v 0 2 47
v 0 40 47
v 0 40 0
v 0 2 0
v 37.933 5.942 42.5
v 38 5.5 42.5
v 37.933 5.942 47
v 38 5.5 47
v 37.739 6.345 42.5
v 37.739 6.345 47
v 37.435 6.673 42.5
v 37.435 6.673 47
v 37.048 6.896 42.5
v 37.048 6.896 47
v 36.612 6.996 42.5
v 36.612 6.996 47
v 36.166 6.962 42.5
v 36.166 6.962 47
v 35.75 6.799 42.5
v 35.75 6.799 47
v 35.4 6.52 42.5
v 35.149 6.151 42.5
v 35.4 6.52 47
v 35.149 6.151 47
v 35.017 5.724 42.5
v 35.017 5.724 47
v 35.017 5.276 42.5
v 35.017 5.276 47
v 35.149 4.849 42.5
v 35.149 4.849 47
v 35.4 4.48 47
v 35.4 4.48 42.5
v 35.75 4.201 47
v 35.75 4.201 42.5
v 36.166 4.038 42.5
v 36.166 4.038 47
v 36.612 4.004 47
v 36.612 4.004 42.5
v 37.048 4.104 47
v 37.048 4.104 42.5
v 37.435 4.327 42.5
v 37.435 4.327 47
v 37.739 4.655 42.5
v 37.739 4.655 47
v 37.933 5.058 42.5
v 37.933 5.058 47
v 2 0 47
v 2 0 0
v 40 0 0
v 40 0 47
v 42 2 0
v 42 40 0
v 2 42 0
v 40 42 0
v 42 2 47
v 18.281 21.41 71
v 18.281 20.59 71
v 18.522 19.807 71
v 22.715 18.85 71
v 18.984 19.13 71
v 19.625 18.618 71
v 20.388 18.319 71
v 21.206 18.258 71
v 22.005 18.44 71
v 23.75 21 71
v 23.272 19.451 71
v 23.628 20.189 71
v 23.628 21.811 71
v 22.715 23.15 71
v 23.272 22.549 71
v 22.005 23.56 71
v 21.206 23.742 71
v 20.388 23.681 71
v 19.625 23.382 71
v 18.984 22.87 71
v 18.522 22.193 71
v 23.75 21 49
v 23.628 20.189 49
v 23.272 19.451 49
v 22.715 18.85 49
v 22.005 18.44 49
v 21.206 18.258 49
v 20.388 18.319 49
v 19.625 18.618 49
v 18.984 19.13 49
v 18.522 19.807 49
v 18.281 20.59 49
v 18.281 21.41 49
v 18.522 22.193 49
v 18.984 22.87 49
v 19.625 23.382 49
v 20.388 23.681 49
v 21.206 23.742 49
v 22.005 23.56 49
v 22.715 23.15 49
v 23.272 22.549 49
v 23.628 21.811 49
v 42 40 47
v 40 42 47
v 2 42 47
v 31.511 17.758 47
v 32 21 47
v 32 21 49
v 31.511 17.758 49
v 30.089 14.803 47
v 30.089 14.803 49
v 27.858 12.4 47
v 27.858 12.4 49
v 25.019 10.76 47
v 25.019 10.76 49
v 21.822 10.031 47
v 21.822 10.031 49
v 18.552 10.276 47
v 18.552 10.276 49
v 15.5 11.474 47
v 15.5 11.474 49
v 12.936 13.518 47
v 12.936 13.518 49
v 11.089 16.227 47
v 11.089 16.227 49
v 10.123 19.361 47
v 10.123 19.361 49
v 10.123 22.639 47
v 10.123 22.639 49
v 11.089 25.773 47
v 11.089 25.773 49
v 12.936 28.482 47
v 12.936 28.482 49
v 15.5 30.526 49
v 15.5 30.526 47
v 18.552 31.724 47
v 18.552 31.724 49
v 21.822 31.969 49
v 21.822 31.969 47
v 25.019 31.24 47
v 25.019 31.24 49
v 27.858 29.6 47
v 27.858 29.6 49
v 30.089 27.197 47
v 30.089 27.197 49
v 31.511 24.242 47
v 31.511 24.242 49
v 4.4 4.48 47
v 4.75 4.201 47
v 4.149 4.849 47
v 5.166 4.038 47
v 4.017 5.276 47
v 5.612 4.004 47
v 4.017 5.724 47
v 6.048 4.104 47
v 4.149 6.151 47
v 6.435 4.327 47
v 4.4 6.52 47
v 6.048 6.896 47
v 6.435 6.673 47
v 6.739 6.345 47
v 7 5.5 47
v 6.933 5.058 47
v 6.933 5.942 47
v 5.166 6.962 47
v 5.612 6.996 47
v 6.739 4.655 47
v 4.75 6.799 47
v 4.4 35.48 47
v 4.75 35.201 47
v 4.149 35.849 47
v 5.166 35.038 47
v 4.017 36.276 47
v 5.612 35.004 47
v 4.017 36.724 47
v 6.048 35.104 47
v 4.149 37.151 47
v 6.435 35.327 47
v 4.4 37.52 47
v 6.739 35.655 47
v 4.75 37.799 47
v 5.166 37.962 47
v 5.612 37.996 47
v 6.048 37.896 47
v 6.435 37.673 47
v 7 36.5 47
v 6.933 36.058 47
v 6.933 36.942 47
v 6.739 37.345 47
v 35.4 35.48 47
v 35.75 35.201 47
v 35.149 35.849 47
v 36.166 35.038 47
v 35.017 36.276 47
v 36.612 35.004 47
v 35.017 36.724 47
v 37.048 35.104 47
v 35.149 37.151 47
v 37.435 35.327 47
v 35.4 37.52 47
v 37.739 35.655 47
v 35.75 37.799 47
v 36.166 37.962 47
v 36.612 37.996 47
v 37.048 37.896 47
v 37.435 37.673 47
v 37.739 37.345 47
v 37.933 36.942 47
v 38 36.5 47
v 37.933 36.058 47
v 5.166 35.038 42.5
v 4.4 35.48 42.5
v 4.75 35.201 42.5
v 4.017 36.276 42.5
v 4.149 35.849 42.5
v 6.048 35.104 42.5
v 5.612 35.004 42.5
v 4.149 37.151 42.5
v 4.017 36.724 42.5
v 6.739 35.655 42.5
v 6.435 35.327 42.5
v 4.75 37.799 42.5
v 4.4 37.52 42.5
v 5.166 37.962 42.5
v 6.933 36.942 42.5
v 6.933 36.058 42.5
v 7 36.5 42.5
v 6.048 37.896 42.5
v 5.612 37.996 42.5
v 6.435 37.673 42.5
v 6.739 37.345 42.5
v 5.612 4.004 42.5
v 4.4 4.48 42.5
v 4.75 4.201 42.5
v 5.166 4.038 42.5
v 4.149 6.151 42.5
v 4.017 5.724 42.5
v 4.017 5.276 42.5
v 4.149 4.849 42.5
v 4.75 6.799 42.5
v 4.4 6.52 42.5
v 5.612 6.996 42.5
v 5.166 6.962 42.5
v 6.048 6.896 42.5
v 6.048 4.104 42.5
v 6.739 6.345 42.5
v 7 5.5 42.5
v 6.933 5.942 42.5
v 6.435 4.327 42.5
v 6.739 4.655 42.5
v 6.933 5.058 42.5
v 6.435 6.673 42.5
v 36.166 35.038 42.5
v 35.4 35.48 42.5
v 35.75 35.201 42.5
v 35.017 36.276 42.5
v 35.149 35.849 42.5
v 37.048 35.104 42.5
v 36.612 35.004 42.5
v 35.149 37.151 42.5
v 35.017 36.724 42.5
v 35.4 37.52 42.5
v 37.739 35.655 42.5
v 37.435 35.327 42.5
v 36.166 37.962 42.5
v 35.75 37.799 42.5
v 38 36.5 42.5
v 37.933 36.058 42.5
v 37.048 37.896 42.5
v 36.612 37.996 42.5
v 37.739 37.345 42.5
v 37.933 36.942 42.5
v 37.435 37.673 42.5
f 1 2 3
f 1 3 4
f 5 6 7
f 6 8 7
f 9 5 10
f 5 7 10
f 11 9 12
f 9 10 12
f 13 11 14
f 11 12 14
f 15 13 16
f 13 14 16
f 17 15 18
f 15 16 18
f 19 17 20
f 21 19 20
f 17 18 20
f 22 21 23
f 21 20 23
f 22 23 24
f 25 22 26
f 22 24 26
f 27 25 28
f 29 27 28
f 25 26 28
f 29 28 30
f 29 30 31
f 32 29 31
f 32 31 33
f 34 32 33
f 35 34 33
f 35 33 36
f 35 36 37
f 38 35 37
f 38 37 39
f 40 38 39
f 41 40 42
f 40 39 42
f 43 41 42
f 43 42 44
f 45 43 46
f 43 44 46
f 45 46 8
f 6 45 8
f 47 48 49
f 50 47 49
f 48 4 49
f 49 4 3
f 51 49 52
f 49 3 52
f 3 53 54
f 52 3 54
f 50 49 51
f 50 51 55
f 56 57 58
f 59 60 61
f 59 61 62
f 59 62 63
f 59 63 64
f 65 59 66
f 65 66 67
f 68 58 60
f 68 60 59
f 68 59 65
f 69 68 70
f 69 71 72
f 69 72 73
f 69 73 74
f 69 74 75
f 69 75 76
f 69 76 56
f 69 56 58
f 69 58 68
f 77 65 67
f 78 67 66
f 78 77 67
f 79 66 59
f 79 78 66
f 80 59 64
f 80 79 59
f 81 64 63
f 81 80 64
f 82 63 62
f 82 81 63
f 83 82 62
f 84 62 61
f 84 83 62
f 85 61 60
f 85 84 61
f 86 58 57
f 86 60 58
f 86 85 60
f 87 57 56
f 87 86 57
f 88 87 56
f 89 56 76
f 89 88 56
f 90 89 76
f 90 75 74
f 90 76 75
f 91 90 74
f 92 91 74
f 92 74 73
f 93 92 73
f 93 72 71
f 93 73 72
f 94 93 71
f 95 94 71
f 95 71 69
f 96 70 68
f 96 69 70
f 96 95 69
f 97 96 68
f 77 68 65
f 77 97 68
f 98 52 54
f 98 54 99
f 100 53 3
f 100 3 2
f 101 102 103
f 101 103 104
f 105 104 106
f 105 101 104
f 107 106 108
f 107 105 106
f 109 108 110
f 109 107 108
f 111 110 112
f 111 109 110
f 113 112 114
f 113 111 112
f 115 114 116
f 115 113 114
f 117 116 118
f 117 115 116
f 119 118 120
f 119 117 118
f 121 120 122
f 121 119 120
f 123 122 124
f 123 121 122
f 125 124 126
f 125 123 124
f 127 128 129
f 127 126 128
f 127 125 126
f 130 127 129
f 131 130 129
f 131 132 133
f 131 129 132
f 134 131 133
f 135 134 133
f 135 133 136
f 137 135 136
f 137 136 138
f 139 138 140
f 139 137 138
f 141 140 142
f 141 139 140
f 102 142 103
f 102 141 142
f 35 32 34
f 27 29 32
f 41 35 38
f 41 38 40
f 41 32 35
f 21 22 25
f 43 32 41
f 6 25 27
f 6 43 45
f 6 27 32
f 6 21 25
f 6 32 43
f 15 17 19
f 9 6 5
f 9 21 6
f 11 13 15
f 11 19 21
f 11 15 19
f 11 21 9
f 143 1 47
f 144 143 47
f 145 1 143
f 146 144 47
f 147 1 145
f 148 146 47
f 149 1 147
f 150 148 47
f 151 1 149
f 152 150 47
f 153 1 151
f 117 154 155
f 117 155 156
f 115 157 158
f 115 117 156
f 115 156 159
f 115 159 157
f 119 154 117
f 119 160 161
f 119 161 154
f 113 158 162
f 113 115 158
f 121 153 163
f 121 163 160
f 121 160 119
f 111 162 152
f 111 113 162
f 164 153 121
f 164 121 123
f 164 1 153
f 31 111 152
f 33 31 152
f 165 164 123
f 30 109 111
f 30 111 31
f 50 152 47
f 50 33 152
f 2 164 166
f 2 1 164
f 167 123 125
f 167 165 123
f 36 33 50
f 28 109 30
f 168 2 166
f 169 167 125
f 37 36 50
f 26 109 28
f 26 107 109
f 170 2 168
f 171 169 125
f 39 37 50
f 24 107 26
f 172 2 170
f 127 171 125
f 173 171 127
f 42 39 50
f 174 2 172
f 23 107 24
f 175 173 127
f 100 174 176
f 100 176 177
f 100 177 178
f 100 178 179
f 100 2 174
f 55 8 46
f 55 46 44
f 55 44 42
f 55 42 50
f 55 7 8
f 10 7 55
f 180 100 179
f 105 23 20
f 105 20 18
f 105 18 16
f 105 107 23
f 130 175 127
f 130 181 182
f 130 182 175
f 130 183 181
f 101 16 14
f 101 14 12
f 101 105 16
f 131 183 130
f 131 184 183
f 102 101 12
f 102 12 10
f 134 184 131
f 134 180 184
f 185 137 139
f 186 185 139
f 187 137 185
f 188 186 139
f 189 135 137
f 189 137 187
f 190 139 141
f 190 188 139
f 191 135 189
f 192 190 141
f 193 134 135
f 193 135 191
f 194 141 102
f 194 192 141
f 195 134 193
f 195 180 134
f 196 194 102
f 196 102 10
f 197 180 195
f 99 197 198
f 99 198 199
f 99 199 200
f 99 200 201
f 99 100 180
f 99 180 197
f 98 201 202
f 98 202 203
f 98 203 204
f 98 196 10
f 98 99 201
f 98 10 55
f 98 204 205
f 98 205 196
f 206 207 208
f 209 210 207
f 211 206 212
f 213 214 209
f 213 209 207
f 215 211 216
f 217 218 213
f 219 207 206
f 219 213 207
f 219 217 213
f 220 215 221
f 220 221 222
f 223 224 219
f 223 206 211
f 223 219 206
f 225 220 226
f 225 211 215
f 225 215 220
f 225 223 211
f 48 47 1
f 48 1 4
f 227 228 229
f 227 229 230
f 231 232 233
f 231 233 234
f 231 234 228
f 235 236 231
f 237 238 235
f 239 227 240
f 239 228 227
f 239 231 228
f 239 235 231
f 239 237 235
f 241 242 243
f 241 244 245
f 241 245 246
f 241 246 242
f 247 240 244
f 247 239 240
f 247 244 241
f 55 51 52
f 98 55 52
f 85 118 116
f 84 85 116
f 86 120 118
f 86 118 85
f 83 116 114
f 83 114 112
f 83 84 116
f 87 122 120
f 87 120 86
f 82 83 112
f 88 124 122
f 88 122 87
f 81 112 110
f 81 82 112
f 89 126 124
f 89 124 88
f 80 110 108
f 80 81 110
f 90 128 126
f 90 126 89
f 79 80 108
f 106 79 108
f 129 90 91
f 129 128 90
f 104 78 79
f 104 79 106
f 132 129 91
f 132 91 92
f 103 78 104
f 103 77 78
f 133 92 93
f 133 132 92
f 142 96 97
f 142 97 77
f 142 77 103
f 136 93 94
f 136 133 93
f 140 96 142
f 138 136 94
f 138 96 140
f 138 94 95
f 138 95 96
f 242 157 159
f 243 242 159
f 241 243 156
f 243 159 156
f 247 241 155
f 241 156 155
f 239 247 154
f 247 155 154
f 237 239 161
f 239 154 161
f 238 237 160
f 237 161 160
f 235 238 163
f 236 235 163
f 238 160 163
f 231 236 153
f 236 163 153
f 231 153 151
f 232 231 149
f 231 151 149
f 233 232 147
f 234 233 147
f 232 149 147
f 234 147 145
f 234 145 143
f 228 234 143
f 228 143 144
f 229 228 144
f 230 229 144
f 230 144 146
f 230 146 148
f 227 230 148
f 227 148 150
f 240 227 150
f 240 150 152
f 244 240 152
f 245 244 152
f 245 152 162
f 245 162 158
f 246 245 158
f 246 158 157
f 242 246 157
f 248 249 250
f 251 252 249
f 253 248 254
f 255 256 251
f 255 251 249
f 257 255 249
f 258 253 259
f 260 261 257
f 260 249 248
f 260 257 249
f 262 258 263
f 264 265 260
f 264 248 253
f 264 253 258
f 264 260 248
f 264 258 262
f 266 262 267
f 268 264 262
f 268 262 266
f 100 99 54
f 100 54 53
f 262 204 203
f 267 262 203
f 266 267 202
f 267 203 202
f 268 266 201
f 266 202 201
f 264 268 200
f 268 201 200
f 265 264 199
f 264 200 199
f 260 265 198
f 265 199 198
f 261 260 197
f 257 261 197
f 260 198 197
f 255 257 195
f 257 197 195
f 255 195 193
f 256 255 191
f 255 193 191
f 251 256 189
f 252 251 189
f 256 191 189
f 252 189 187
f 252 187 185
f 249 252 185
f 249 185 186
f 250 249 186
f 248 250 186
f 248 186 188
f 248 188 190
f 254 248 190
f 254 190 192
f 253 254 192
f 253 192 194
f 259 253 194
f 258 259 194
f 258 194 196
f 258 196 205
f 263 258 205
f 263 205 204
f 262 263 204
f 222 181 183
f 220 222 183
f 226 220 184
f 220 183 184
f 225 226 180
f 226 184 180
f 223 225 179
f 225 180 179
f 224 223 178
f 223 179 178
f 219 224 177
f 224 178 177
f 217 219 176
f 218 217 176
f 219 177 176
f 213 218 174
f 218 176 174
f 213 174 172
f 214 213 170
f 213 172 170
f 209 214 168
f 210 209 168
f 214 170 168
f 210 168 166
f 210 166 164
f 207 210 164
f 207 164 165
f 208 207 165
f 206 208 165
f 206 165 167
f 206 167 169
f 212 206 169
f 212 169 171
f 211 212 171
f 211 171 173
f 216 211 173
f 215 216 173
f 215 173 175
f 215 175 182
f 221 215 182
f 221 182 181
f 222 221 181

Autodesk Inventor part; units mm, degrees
ref_plane "YZ Plane" through (0, 0, 0) normal (1, 0, 0) x (0, 1, 0)
sketch "Sketch1" plane through (0, 0, 0) normal (0, 0, 1) x (1, 0, 0)
  line L0 (0, 0) -> (42, 0)
  line L1 (42, 0) -> (42, 42)
  line L2 (42, 42) -> (0, 42)
  line L3 (0, 42) -> (0, 0)
  dimension "d0" = 42
  dimension "d1" = 42
extrude "Extrusion1" add sketch "Sketch1" along normal blind 47
chamfer "Chamfer1" distance 2 angle 45 4 edges at (42, 42, 23.5) (0, 42, 23.5) (42, 0, 23.5) (0, 0, 23.5)
sketch "Sketch2" plane through (0, 0, 47) normal (0, 0, 1) x (1, 0, 0)
  circle A0 centre (21, 21) radius 11
  line L0 (42, 2) -> (42, 40) projected
  line L1 (40, 42) -> (2, 42) projected
  point P0 (0, 0)
  point P1 (21, 42)
  dimension "d7" = 22
  dimension "d10" = 21
  dimension "d11" = 21
extrude "Extrusion2" add sketch "Sketch2" along normal blind 2
sketch "Sketch3" plane through (21, 21, 49) normal (0, 0, 1) x (1, 0, 0)
  circle A0 centre (0, 0) radius 2.75
  circle A1 centre (0, 0) radius 11 projected
  point P0 (-21, -21)
  dimension "d14" = 5.5
extrude "Extrusion3" add sketch "Sketch3" along normal blind 24 from surface at -2 contours A0
sketch "Sketch4" plane through (0, 0, 47) normal (0, 0, 1) x (1, 0, 0)
  circle A0 centre (21, 21) radius 11 projected
  line L0 (2, 0) -> (0, 2) projected
  line L1 (2, 0) -> (40, 0) projected
  line L2 (42, 2) -> (40, 0) projected
  line L3 (42, 2) -> (42, 40) projected
  line L4 (40, 42) -> (42, 40) projected
  line L5 (40, 42) -> (2, 42) projected
  line L6 (0, 40) -> (2, 42) projected
  line L7 (0, 40) -> (0, 2) projected
  circle A1 centre (21, 21) radius 2.75 projected
  circle A2 centre (21, 21) radius 11 projected
  circle A3 centre (21, 21) radius 2.75 projected
  line L8 (5.5, 5.5) -> (36.5, 5.5)
  line L9 (36.5, 5.5) -> (36.5, 36.5)
  line L10 (36.5, 36.5) -> (5.5, 36.5)
  line L11 (5.5, 36.5) -> (5.5, 5.5)
  line L12 (5.5, 5.5) -> (36.5, 36.5) construction
  line L13 (36.5, 5.5) -> (5.5, 36.5) construction
  circle A4 centre (5.5, 5.5) radius 1.5
  circle A5 centre (5.5, 36.5) radius 1.5
  circle A6 centre (36.5, 36.5) radius 1.5
  circle A7 centre (36.5, 5.5) radius 1.5
  point P0 (0, 0)
  dimension "d17" = 31
  dimension "d18" = 31
  dimension "d19" = 3
extrude "Extrusion4" cut sketch "Sketch4" against normal blind 4.5 contours L11 A4 L8 | L8 A4 L11 | A7 L9 L8 | L8 L9 A7 | A5 L10 L11 | L11 L10 A5 | A6 L10 L9 | L9 L10 A6
ref_plane "Work Plane1" through (21, 2, 0) normal (1, 0, 0) x (0, 0, -1)
ref_plane "Work Plane2" through (21, 2, 0) normal (1, 0, 0) x (0, 0, -1)
properties part number "stepper motor" material "Aluminum"
